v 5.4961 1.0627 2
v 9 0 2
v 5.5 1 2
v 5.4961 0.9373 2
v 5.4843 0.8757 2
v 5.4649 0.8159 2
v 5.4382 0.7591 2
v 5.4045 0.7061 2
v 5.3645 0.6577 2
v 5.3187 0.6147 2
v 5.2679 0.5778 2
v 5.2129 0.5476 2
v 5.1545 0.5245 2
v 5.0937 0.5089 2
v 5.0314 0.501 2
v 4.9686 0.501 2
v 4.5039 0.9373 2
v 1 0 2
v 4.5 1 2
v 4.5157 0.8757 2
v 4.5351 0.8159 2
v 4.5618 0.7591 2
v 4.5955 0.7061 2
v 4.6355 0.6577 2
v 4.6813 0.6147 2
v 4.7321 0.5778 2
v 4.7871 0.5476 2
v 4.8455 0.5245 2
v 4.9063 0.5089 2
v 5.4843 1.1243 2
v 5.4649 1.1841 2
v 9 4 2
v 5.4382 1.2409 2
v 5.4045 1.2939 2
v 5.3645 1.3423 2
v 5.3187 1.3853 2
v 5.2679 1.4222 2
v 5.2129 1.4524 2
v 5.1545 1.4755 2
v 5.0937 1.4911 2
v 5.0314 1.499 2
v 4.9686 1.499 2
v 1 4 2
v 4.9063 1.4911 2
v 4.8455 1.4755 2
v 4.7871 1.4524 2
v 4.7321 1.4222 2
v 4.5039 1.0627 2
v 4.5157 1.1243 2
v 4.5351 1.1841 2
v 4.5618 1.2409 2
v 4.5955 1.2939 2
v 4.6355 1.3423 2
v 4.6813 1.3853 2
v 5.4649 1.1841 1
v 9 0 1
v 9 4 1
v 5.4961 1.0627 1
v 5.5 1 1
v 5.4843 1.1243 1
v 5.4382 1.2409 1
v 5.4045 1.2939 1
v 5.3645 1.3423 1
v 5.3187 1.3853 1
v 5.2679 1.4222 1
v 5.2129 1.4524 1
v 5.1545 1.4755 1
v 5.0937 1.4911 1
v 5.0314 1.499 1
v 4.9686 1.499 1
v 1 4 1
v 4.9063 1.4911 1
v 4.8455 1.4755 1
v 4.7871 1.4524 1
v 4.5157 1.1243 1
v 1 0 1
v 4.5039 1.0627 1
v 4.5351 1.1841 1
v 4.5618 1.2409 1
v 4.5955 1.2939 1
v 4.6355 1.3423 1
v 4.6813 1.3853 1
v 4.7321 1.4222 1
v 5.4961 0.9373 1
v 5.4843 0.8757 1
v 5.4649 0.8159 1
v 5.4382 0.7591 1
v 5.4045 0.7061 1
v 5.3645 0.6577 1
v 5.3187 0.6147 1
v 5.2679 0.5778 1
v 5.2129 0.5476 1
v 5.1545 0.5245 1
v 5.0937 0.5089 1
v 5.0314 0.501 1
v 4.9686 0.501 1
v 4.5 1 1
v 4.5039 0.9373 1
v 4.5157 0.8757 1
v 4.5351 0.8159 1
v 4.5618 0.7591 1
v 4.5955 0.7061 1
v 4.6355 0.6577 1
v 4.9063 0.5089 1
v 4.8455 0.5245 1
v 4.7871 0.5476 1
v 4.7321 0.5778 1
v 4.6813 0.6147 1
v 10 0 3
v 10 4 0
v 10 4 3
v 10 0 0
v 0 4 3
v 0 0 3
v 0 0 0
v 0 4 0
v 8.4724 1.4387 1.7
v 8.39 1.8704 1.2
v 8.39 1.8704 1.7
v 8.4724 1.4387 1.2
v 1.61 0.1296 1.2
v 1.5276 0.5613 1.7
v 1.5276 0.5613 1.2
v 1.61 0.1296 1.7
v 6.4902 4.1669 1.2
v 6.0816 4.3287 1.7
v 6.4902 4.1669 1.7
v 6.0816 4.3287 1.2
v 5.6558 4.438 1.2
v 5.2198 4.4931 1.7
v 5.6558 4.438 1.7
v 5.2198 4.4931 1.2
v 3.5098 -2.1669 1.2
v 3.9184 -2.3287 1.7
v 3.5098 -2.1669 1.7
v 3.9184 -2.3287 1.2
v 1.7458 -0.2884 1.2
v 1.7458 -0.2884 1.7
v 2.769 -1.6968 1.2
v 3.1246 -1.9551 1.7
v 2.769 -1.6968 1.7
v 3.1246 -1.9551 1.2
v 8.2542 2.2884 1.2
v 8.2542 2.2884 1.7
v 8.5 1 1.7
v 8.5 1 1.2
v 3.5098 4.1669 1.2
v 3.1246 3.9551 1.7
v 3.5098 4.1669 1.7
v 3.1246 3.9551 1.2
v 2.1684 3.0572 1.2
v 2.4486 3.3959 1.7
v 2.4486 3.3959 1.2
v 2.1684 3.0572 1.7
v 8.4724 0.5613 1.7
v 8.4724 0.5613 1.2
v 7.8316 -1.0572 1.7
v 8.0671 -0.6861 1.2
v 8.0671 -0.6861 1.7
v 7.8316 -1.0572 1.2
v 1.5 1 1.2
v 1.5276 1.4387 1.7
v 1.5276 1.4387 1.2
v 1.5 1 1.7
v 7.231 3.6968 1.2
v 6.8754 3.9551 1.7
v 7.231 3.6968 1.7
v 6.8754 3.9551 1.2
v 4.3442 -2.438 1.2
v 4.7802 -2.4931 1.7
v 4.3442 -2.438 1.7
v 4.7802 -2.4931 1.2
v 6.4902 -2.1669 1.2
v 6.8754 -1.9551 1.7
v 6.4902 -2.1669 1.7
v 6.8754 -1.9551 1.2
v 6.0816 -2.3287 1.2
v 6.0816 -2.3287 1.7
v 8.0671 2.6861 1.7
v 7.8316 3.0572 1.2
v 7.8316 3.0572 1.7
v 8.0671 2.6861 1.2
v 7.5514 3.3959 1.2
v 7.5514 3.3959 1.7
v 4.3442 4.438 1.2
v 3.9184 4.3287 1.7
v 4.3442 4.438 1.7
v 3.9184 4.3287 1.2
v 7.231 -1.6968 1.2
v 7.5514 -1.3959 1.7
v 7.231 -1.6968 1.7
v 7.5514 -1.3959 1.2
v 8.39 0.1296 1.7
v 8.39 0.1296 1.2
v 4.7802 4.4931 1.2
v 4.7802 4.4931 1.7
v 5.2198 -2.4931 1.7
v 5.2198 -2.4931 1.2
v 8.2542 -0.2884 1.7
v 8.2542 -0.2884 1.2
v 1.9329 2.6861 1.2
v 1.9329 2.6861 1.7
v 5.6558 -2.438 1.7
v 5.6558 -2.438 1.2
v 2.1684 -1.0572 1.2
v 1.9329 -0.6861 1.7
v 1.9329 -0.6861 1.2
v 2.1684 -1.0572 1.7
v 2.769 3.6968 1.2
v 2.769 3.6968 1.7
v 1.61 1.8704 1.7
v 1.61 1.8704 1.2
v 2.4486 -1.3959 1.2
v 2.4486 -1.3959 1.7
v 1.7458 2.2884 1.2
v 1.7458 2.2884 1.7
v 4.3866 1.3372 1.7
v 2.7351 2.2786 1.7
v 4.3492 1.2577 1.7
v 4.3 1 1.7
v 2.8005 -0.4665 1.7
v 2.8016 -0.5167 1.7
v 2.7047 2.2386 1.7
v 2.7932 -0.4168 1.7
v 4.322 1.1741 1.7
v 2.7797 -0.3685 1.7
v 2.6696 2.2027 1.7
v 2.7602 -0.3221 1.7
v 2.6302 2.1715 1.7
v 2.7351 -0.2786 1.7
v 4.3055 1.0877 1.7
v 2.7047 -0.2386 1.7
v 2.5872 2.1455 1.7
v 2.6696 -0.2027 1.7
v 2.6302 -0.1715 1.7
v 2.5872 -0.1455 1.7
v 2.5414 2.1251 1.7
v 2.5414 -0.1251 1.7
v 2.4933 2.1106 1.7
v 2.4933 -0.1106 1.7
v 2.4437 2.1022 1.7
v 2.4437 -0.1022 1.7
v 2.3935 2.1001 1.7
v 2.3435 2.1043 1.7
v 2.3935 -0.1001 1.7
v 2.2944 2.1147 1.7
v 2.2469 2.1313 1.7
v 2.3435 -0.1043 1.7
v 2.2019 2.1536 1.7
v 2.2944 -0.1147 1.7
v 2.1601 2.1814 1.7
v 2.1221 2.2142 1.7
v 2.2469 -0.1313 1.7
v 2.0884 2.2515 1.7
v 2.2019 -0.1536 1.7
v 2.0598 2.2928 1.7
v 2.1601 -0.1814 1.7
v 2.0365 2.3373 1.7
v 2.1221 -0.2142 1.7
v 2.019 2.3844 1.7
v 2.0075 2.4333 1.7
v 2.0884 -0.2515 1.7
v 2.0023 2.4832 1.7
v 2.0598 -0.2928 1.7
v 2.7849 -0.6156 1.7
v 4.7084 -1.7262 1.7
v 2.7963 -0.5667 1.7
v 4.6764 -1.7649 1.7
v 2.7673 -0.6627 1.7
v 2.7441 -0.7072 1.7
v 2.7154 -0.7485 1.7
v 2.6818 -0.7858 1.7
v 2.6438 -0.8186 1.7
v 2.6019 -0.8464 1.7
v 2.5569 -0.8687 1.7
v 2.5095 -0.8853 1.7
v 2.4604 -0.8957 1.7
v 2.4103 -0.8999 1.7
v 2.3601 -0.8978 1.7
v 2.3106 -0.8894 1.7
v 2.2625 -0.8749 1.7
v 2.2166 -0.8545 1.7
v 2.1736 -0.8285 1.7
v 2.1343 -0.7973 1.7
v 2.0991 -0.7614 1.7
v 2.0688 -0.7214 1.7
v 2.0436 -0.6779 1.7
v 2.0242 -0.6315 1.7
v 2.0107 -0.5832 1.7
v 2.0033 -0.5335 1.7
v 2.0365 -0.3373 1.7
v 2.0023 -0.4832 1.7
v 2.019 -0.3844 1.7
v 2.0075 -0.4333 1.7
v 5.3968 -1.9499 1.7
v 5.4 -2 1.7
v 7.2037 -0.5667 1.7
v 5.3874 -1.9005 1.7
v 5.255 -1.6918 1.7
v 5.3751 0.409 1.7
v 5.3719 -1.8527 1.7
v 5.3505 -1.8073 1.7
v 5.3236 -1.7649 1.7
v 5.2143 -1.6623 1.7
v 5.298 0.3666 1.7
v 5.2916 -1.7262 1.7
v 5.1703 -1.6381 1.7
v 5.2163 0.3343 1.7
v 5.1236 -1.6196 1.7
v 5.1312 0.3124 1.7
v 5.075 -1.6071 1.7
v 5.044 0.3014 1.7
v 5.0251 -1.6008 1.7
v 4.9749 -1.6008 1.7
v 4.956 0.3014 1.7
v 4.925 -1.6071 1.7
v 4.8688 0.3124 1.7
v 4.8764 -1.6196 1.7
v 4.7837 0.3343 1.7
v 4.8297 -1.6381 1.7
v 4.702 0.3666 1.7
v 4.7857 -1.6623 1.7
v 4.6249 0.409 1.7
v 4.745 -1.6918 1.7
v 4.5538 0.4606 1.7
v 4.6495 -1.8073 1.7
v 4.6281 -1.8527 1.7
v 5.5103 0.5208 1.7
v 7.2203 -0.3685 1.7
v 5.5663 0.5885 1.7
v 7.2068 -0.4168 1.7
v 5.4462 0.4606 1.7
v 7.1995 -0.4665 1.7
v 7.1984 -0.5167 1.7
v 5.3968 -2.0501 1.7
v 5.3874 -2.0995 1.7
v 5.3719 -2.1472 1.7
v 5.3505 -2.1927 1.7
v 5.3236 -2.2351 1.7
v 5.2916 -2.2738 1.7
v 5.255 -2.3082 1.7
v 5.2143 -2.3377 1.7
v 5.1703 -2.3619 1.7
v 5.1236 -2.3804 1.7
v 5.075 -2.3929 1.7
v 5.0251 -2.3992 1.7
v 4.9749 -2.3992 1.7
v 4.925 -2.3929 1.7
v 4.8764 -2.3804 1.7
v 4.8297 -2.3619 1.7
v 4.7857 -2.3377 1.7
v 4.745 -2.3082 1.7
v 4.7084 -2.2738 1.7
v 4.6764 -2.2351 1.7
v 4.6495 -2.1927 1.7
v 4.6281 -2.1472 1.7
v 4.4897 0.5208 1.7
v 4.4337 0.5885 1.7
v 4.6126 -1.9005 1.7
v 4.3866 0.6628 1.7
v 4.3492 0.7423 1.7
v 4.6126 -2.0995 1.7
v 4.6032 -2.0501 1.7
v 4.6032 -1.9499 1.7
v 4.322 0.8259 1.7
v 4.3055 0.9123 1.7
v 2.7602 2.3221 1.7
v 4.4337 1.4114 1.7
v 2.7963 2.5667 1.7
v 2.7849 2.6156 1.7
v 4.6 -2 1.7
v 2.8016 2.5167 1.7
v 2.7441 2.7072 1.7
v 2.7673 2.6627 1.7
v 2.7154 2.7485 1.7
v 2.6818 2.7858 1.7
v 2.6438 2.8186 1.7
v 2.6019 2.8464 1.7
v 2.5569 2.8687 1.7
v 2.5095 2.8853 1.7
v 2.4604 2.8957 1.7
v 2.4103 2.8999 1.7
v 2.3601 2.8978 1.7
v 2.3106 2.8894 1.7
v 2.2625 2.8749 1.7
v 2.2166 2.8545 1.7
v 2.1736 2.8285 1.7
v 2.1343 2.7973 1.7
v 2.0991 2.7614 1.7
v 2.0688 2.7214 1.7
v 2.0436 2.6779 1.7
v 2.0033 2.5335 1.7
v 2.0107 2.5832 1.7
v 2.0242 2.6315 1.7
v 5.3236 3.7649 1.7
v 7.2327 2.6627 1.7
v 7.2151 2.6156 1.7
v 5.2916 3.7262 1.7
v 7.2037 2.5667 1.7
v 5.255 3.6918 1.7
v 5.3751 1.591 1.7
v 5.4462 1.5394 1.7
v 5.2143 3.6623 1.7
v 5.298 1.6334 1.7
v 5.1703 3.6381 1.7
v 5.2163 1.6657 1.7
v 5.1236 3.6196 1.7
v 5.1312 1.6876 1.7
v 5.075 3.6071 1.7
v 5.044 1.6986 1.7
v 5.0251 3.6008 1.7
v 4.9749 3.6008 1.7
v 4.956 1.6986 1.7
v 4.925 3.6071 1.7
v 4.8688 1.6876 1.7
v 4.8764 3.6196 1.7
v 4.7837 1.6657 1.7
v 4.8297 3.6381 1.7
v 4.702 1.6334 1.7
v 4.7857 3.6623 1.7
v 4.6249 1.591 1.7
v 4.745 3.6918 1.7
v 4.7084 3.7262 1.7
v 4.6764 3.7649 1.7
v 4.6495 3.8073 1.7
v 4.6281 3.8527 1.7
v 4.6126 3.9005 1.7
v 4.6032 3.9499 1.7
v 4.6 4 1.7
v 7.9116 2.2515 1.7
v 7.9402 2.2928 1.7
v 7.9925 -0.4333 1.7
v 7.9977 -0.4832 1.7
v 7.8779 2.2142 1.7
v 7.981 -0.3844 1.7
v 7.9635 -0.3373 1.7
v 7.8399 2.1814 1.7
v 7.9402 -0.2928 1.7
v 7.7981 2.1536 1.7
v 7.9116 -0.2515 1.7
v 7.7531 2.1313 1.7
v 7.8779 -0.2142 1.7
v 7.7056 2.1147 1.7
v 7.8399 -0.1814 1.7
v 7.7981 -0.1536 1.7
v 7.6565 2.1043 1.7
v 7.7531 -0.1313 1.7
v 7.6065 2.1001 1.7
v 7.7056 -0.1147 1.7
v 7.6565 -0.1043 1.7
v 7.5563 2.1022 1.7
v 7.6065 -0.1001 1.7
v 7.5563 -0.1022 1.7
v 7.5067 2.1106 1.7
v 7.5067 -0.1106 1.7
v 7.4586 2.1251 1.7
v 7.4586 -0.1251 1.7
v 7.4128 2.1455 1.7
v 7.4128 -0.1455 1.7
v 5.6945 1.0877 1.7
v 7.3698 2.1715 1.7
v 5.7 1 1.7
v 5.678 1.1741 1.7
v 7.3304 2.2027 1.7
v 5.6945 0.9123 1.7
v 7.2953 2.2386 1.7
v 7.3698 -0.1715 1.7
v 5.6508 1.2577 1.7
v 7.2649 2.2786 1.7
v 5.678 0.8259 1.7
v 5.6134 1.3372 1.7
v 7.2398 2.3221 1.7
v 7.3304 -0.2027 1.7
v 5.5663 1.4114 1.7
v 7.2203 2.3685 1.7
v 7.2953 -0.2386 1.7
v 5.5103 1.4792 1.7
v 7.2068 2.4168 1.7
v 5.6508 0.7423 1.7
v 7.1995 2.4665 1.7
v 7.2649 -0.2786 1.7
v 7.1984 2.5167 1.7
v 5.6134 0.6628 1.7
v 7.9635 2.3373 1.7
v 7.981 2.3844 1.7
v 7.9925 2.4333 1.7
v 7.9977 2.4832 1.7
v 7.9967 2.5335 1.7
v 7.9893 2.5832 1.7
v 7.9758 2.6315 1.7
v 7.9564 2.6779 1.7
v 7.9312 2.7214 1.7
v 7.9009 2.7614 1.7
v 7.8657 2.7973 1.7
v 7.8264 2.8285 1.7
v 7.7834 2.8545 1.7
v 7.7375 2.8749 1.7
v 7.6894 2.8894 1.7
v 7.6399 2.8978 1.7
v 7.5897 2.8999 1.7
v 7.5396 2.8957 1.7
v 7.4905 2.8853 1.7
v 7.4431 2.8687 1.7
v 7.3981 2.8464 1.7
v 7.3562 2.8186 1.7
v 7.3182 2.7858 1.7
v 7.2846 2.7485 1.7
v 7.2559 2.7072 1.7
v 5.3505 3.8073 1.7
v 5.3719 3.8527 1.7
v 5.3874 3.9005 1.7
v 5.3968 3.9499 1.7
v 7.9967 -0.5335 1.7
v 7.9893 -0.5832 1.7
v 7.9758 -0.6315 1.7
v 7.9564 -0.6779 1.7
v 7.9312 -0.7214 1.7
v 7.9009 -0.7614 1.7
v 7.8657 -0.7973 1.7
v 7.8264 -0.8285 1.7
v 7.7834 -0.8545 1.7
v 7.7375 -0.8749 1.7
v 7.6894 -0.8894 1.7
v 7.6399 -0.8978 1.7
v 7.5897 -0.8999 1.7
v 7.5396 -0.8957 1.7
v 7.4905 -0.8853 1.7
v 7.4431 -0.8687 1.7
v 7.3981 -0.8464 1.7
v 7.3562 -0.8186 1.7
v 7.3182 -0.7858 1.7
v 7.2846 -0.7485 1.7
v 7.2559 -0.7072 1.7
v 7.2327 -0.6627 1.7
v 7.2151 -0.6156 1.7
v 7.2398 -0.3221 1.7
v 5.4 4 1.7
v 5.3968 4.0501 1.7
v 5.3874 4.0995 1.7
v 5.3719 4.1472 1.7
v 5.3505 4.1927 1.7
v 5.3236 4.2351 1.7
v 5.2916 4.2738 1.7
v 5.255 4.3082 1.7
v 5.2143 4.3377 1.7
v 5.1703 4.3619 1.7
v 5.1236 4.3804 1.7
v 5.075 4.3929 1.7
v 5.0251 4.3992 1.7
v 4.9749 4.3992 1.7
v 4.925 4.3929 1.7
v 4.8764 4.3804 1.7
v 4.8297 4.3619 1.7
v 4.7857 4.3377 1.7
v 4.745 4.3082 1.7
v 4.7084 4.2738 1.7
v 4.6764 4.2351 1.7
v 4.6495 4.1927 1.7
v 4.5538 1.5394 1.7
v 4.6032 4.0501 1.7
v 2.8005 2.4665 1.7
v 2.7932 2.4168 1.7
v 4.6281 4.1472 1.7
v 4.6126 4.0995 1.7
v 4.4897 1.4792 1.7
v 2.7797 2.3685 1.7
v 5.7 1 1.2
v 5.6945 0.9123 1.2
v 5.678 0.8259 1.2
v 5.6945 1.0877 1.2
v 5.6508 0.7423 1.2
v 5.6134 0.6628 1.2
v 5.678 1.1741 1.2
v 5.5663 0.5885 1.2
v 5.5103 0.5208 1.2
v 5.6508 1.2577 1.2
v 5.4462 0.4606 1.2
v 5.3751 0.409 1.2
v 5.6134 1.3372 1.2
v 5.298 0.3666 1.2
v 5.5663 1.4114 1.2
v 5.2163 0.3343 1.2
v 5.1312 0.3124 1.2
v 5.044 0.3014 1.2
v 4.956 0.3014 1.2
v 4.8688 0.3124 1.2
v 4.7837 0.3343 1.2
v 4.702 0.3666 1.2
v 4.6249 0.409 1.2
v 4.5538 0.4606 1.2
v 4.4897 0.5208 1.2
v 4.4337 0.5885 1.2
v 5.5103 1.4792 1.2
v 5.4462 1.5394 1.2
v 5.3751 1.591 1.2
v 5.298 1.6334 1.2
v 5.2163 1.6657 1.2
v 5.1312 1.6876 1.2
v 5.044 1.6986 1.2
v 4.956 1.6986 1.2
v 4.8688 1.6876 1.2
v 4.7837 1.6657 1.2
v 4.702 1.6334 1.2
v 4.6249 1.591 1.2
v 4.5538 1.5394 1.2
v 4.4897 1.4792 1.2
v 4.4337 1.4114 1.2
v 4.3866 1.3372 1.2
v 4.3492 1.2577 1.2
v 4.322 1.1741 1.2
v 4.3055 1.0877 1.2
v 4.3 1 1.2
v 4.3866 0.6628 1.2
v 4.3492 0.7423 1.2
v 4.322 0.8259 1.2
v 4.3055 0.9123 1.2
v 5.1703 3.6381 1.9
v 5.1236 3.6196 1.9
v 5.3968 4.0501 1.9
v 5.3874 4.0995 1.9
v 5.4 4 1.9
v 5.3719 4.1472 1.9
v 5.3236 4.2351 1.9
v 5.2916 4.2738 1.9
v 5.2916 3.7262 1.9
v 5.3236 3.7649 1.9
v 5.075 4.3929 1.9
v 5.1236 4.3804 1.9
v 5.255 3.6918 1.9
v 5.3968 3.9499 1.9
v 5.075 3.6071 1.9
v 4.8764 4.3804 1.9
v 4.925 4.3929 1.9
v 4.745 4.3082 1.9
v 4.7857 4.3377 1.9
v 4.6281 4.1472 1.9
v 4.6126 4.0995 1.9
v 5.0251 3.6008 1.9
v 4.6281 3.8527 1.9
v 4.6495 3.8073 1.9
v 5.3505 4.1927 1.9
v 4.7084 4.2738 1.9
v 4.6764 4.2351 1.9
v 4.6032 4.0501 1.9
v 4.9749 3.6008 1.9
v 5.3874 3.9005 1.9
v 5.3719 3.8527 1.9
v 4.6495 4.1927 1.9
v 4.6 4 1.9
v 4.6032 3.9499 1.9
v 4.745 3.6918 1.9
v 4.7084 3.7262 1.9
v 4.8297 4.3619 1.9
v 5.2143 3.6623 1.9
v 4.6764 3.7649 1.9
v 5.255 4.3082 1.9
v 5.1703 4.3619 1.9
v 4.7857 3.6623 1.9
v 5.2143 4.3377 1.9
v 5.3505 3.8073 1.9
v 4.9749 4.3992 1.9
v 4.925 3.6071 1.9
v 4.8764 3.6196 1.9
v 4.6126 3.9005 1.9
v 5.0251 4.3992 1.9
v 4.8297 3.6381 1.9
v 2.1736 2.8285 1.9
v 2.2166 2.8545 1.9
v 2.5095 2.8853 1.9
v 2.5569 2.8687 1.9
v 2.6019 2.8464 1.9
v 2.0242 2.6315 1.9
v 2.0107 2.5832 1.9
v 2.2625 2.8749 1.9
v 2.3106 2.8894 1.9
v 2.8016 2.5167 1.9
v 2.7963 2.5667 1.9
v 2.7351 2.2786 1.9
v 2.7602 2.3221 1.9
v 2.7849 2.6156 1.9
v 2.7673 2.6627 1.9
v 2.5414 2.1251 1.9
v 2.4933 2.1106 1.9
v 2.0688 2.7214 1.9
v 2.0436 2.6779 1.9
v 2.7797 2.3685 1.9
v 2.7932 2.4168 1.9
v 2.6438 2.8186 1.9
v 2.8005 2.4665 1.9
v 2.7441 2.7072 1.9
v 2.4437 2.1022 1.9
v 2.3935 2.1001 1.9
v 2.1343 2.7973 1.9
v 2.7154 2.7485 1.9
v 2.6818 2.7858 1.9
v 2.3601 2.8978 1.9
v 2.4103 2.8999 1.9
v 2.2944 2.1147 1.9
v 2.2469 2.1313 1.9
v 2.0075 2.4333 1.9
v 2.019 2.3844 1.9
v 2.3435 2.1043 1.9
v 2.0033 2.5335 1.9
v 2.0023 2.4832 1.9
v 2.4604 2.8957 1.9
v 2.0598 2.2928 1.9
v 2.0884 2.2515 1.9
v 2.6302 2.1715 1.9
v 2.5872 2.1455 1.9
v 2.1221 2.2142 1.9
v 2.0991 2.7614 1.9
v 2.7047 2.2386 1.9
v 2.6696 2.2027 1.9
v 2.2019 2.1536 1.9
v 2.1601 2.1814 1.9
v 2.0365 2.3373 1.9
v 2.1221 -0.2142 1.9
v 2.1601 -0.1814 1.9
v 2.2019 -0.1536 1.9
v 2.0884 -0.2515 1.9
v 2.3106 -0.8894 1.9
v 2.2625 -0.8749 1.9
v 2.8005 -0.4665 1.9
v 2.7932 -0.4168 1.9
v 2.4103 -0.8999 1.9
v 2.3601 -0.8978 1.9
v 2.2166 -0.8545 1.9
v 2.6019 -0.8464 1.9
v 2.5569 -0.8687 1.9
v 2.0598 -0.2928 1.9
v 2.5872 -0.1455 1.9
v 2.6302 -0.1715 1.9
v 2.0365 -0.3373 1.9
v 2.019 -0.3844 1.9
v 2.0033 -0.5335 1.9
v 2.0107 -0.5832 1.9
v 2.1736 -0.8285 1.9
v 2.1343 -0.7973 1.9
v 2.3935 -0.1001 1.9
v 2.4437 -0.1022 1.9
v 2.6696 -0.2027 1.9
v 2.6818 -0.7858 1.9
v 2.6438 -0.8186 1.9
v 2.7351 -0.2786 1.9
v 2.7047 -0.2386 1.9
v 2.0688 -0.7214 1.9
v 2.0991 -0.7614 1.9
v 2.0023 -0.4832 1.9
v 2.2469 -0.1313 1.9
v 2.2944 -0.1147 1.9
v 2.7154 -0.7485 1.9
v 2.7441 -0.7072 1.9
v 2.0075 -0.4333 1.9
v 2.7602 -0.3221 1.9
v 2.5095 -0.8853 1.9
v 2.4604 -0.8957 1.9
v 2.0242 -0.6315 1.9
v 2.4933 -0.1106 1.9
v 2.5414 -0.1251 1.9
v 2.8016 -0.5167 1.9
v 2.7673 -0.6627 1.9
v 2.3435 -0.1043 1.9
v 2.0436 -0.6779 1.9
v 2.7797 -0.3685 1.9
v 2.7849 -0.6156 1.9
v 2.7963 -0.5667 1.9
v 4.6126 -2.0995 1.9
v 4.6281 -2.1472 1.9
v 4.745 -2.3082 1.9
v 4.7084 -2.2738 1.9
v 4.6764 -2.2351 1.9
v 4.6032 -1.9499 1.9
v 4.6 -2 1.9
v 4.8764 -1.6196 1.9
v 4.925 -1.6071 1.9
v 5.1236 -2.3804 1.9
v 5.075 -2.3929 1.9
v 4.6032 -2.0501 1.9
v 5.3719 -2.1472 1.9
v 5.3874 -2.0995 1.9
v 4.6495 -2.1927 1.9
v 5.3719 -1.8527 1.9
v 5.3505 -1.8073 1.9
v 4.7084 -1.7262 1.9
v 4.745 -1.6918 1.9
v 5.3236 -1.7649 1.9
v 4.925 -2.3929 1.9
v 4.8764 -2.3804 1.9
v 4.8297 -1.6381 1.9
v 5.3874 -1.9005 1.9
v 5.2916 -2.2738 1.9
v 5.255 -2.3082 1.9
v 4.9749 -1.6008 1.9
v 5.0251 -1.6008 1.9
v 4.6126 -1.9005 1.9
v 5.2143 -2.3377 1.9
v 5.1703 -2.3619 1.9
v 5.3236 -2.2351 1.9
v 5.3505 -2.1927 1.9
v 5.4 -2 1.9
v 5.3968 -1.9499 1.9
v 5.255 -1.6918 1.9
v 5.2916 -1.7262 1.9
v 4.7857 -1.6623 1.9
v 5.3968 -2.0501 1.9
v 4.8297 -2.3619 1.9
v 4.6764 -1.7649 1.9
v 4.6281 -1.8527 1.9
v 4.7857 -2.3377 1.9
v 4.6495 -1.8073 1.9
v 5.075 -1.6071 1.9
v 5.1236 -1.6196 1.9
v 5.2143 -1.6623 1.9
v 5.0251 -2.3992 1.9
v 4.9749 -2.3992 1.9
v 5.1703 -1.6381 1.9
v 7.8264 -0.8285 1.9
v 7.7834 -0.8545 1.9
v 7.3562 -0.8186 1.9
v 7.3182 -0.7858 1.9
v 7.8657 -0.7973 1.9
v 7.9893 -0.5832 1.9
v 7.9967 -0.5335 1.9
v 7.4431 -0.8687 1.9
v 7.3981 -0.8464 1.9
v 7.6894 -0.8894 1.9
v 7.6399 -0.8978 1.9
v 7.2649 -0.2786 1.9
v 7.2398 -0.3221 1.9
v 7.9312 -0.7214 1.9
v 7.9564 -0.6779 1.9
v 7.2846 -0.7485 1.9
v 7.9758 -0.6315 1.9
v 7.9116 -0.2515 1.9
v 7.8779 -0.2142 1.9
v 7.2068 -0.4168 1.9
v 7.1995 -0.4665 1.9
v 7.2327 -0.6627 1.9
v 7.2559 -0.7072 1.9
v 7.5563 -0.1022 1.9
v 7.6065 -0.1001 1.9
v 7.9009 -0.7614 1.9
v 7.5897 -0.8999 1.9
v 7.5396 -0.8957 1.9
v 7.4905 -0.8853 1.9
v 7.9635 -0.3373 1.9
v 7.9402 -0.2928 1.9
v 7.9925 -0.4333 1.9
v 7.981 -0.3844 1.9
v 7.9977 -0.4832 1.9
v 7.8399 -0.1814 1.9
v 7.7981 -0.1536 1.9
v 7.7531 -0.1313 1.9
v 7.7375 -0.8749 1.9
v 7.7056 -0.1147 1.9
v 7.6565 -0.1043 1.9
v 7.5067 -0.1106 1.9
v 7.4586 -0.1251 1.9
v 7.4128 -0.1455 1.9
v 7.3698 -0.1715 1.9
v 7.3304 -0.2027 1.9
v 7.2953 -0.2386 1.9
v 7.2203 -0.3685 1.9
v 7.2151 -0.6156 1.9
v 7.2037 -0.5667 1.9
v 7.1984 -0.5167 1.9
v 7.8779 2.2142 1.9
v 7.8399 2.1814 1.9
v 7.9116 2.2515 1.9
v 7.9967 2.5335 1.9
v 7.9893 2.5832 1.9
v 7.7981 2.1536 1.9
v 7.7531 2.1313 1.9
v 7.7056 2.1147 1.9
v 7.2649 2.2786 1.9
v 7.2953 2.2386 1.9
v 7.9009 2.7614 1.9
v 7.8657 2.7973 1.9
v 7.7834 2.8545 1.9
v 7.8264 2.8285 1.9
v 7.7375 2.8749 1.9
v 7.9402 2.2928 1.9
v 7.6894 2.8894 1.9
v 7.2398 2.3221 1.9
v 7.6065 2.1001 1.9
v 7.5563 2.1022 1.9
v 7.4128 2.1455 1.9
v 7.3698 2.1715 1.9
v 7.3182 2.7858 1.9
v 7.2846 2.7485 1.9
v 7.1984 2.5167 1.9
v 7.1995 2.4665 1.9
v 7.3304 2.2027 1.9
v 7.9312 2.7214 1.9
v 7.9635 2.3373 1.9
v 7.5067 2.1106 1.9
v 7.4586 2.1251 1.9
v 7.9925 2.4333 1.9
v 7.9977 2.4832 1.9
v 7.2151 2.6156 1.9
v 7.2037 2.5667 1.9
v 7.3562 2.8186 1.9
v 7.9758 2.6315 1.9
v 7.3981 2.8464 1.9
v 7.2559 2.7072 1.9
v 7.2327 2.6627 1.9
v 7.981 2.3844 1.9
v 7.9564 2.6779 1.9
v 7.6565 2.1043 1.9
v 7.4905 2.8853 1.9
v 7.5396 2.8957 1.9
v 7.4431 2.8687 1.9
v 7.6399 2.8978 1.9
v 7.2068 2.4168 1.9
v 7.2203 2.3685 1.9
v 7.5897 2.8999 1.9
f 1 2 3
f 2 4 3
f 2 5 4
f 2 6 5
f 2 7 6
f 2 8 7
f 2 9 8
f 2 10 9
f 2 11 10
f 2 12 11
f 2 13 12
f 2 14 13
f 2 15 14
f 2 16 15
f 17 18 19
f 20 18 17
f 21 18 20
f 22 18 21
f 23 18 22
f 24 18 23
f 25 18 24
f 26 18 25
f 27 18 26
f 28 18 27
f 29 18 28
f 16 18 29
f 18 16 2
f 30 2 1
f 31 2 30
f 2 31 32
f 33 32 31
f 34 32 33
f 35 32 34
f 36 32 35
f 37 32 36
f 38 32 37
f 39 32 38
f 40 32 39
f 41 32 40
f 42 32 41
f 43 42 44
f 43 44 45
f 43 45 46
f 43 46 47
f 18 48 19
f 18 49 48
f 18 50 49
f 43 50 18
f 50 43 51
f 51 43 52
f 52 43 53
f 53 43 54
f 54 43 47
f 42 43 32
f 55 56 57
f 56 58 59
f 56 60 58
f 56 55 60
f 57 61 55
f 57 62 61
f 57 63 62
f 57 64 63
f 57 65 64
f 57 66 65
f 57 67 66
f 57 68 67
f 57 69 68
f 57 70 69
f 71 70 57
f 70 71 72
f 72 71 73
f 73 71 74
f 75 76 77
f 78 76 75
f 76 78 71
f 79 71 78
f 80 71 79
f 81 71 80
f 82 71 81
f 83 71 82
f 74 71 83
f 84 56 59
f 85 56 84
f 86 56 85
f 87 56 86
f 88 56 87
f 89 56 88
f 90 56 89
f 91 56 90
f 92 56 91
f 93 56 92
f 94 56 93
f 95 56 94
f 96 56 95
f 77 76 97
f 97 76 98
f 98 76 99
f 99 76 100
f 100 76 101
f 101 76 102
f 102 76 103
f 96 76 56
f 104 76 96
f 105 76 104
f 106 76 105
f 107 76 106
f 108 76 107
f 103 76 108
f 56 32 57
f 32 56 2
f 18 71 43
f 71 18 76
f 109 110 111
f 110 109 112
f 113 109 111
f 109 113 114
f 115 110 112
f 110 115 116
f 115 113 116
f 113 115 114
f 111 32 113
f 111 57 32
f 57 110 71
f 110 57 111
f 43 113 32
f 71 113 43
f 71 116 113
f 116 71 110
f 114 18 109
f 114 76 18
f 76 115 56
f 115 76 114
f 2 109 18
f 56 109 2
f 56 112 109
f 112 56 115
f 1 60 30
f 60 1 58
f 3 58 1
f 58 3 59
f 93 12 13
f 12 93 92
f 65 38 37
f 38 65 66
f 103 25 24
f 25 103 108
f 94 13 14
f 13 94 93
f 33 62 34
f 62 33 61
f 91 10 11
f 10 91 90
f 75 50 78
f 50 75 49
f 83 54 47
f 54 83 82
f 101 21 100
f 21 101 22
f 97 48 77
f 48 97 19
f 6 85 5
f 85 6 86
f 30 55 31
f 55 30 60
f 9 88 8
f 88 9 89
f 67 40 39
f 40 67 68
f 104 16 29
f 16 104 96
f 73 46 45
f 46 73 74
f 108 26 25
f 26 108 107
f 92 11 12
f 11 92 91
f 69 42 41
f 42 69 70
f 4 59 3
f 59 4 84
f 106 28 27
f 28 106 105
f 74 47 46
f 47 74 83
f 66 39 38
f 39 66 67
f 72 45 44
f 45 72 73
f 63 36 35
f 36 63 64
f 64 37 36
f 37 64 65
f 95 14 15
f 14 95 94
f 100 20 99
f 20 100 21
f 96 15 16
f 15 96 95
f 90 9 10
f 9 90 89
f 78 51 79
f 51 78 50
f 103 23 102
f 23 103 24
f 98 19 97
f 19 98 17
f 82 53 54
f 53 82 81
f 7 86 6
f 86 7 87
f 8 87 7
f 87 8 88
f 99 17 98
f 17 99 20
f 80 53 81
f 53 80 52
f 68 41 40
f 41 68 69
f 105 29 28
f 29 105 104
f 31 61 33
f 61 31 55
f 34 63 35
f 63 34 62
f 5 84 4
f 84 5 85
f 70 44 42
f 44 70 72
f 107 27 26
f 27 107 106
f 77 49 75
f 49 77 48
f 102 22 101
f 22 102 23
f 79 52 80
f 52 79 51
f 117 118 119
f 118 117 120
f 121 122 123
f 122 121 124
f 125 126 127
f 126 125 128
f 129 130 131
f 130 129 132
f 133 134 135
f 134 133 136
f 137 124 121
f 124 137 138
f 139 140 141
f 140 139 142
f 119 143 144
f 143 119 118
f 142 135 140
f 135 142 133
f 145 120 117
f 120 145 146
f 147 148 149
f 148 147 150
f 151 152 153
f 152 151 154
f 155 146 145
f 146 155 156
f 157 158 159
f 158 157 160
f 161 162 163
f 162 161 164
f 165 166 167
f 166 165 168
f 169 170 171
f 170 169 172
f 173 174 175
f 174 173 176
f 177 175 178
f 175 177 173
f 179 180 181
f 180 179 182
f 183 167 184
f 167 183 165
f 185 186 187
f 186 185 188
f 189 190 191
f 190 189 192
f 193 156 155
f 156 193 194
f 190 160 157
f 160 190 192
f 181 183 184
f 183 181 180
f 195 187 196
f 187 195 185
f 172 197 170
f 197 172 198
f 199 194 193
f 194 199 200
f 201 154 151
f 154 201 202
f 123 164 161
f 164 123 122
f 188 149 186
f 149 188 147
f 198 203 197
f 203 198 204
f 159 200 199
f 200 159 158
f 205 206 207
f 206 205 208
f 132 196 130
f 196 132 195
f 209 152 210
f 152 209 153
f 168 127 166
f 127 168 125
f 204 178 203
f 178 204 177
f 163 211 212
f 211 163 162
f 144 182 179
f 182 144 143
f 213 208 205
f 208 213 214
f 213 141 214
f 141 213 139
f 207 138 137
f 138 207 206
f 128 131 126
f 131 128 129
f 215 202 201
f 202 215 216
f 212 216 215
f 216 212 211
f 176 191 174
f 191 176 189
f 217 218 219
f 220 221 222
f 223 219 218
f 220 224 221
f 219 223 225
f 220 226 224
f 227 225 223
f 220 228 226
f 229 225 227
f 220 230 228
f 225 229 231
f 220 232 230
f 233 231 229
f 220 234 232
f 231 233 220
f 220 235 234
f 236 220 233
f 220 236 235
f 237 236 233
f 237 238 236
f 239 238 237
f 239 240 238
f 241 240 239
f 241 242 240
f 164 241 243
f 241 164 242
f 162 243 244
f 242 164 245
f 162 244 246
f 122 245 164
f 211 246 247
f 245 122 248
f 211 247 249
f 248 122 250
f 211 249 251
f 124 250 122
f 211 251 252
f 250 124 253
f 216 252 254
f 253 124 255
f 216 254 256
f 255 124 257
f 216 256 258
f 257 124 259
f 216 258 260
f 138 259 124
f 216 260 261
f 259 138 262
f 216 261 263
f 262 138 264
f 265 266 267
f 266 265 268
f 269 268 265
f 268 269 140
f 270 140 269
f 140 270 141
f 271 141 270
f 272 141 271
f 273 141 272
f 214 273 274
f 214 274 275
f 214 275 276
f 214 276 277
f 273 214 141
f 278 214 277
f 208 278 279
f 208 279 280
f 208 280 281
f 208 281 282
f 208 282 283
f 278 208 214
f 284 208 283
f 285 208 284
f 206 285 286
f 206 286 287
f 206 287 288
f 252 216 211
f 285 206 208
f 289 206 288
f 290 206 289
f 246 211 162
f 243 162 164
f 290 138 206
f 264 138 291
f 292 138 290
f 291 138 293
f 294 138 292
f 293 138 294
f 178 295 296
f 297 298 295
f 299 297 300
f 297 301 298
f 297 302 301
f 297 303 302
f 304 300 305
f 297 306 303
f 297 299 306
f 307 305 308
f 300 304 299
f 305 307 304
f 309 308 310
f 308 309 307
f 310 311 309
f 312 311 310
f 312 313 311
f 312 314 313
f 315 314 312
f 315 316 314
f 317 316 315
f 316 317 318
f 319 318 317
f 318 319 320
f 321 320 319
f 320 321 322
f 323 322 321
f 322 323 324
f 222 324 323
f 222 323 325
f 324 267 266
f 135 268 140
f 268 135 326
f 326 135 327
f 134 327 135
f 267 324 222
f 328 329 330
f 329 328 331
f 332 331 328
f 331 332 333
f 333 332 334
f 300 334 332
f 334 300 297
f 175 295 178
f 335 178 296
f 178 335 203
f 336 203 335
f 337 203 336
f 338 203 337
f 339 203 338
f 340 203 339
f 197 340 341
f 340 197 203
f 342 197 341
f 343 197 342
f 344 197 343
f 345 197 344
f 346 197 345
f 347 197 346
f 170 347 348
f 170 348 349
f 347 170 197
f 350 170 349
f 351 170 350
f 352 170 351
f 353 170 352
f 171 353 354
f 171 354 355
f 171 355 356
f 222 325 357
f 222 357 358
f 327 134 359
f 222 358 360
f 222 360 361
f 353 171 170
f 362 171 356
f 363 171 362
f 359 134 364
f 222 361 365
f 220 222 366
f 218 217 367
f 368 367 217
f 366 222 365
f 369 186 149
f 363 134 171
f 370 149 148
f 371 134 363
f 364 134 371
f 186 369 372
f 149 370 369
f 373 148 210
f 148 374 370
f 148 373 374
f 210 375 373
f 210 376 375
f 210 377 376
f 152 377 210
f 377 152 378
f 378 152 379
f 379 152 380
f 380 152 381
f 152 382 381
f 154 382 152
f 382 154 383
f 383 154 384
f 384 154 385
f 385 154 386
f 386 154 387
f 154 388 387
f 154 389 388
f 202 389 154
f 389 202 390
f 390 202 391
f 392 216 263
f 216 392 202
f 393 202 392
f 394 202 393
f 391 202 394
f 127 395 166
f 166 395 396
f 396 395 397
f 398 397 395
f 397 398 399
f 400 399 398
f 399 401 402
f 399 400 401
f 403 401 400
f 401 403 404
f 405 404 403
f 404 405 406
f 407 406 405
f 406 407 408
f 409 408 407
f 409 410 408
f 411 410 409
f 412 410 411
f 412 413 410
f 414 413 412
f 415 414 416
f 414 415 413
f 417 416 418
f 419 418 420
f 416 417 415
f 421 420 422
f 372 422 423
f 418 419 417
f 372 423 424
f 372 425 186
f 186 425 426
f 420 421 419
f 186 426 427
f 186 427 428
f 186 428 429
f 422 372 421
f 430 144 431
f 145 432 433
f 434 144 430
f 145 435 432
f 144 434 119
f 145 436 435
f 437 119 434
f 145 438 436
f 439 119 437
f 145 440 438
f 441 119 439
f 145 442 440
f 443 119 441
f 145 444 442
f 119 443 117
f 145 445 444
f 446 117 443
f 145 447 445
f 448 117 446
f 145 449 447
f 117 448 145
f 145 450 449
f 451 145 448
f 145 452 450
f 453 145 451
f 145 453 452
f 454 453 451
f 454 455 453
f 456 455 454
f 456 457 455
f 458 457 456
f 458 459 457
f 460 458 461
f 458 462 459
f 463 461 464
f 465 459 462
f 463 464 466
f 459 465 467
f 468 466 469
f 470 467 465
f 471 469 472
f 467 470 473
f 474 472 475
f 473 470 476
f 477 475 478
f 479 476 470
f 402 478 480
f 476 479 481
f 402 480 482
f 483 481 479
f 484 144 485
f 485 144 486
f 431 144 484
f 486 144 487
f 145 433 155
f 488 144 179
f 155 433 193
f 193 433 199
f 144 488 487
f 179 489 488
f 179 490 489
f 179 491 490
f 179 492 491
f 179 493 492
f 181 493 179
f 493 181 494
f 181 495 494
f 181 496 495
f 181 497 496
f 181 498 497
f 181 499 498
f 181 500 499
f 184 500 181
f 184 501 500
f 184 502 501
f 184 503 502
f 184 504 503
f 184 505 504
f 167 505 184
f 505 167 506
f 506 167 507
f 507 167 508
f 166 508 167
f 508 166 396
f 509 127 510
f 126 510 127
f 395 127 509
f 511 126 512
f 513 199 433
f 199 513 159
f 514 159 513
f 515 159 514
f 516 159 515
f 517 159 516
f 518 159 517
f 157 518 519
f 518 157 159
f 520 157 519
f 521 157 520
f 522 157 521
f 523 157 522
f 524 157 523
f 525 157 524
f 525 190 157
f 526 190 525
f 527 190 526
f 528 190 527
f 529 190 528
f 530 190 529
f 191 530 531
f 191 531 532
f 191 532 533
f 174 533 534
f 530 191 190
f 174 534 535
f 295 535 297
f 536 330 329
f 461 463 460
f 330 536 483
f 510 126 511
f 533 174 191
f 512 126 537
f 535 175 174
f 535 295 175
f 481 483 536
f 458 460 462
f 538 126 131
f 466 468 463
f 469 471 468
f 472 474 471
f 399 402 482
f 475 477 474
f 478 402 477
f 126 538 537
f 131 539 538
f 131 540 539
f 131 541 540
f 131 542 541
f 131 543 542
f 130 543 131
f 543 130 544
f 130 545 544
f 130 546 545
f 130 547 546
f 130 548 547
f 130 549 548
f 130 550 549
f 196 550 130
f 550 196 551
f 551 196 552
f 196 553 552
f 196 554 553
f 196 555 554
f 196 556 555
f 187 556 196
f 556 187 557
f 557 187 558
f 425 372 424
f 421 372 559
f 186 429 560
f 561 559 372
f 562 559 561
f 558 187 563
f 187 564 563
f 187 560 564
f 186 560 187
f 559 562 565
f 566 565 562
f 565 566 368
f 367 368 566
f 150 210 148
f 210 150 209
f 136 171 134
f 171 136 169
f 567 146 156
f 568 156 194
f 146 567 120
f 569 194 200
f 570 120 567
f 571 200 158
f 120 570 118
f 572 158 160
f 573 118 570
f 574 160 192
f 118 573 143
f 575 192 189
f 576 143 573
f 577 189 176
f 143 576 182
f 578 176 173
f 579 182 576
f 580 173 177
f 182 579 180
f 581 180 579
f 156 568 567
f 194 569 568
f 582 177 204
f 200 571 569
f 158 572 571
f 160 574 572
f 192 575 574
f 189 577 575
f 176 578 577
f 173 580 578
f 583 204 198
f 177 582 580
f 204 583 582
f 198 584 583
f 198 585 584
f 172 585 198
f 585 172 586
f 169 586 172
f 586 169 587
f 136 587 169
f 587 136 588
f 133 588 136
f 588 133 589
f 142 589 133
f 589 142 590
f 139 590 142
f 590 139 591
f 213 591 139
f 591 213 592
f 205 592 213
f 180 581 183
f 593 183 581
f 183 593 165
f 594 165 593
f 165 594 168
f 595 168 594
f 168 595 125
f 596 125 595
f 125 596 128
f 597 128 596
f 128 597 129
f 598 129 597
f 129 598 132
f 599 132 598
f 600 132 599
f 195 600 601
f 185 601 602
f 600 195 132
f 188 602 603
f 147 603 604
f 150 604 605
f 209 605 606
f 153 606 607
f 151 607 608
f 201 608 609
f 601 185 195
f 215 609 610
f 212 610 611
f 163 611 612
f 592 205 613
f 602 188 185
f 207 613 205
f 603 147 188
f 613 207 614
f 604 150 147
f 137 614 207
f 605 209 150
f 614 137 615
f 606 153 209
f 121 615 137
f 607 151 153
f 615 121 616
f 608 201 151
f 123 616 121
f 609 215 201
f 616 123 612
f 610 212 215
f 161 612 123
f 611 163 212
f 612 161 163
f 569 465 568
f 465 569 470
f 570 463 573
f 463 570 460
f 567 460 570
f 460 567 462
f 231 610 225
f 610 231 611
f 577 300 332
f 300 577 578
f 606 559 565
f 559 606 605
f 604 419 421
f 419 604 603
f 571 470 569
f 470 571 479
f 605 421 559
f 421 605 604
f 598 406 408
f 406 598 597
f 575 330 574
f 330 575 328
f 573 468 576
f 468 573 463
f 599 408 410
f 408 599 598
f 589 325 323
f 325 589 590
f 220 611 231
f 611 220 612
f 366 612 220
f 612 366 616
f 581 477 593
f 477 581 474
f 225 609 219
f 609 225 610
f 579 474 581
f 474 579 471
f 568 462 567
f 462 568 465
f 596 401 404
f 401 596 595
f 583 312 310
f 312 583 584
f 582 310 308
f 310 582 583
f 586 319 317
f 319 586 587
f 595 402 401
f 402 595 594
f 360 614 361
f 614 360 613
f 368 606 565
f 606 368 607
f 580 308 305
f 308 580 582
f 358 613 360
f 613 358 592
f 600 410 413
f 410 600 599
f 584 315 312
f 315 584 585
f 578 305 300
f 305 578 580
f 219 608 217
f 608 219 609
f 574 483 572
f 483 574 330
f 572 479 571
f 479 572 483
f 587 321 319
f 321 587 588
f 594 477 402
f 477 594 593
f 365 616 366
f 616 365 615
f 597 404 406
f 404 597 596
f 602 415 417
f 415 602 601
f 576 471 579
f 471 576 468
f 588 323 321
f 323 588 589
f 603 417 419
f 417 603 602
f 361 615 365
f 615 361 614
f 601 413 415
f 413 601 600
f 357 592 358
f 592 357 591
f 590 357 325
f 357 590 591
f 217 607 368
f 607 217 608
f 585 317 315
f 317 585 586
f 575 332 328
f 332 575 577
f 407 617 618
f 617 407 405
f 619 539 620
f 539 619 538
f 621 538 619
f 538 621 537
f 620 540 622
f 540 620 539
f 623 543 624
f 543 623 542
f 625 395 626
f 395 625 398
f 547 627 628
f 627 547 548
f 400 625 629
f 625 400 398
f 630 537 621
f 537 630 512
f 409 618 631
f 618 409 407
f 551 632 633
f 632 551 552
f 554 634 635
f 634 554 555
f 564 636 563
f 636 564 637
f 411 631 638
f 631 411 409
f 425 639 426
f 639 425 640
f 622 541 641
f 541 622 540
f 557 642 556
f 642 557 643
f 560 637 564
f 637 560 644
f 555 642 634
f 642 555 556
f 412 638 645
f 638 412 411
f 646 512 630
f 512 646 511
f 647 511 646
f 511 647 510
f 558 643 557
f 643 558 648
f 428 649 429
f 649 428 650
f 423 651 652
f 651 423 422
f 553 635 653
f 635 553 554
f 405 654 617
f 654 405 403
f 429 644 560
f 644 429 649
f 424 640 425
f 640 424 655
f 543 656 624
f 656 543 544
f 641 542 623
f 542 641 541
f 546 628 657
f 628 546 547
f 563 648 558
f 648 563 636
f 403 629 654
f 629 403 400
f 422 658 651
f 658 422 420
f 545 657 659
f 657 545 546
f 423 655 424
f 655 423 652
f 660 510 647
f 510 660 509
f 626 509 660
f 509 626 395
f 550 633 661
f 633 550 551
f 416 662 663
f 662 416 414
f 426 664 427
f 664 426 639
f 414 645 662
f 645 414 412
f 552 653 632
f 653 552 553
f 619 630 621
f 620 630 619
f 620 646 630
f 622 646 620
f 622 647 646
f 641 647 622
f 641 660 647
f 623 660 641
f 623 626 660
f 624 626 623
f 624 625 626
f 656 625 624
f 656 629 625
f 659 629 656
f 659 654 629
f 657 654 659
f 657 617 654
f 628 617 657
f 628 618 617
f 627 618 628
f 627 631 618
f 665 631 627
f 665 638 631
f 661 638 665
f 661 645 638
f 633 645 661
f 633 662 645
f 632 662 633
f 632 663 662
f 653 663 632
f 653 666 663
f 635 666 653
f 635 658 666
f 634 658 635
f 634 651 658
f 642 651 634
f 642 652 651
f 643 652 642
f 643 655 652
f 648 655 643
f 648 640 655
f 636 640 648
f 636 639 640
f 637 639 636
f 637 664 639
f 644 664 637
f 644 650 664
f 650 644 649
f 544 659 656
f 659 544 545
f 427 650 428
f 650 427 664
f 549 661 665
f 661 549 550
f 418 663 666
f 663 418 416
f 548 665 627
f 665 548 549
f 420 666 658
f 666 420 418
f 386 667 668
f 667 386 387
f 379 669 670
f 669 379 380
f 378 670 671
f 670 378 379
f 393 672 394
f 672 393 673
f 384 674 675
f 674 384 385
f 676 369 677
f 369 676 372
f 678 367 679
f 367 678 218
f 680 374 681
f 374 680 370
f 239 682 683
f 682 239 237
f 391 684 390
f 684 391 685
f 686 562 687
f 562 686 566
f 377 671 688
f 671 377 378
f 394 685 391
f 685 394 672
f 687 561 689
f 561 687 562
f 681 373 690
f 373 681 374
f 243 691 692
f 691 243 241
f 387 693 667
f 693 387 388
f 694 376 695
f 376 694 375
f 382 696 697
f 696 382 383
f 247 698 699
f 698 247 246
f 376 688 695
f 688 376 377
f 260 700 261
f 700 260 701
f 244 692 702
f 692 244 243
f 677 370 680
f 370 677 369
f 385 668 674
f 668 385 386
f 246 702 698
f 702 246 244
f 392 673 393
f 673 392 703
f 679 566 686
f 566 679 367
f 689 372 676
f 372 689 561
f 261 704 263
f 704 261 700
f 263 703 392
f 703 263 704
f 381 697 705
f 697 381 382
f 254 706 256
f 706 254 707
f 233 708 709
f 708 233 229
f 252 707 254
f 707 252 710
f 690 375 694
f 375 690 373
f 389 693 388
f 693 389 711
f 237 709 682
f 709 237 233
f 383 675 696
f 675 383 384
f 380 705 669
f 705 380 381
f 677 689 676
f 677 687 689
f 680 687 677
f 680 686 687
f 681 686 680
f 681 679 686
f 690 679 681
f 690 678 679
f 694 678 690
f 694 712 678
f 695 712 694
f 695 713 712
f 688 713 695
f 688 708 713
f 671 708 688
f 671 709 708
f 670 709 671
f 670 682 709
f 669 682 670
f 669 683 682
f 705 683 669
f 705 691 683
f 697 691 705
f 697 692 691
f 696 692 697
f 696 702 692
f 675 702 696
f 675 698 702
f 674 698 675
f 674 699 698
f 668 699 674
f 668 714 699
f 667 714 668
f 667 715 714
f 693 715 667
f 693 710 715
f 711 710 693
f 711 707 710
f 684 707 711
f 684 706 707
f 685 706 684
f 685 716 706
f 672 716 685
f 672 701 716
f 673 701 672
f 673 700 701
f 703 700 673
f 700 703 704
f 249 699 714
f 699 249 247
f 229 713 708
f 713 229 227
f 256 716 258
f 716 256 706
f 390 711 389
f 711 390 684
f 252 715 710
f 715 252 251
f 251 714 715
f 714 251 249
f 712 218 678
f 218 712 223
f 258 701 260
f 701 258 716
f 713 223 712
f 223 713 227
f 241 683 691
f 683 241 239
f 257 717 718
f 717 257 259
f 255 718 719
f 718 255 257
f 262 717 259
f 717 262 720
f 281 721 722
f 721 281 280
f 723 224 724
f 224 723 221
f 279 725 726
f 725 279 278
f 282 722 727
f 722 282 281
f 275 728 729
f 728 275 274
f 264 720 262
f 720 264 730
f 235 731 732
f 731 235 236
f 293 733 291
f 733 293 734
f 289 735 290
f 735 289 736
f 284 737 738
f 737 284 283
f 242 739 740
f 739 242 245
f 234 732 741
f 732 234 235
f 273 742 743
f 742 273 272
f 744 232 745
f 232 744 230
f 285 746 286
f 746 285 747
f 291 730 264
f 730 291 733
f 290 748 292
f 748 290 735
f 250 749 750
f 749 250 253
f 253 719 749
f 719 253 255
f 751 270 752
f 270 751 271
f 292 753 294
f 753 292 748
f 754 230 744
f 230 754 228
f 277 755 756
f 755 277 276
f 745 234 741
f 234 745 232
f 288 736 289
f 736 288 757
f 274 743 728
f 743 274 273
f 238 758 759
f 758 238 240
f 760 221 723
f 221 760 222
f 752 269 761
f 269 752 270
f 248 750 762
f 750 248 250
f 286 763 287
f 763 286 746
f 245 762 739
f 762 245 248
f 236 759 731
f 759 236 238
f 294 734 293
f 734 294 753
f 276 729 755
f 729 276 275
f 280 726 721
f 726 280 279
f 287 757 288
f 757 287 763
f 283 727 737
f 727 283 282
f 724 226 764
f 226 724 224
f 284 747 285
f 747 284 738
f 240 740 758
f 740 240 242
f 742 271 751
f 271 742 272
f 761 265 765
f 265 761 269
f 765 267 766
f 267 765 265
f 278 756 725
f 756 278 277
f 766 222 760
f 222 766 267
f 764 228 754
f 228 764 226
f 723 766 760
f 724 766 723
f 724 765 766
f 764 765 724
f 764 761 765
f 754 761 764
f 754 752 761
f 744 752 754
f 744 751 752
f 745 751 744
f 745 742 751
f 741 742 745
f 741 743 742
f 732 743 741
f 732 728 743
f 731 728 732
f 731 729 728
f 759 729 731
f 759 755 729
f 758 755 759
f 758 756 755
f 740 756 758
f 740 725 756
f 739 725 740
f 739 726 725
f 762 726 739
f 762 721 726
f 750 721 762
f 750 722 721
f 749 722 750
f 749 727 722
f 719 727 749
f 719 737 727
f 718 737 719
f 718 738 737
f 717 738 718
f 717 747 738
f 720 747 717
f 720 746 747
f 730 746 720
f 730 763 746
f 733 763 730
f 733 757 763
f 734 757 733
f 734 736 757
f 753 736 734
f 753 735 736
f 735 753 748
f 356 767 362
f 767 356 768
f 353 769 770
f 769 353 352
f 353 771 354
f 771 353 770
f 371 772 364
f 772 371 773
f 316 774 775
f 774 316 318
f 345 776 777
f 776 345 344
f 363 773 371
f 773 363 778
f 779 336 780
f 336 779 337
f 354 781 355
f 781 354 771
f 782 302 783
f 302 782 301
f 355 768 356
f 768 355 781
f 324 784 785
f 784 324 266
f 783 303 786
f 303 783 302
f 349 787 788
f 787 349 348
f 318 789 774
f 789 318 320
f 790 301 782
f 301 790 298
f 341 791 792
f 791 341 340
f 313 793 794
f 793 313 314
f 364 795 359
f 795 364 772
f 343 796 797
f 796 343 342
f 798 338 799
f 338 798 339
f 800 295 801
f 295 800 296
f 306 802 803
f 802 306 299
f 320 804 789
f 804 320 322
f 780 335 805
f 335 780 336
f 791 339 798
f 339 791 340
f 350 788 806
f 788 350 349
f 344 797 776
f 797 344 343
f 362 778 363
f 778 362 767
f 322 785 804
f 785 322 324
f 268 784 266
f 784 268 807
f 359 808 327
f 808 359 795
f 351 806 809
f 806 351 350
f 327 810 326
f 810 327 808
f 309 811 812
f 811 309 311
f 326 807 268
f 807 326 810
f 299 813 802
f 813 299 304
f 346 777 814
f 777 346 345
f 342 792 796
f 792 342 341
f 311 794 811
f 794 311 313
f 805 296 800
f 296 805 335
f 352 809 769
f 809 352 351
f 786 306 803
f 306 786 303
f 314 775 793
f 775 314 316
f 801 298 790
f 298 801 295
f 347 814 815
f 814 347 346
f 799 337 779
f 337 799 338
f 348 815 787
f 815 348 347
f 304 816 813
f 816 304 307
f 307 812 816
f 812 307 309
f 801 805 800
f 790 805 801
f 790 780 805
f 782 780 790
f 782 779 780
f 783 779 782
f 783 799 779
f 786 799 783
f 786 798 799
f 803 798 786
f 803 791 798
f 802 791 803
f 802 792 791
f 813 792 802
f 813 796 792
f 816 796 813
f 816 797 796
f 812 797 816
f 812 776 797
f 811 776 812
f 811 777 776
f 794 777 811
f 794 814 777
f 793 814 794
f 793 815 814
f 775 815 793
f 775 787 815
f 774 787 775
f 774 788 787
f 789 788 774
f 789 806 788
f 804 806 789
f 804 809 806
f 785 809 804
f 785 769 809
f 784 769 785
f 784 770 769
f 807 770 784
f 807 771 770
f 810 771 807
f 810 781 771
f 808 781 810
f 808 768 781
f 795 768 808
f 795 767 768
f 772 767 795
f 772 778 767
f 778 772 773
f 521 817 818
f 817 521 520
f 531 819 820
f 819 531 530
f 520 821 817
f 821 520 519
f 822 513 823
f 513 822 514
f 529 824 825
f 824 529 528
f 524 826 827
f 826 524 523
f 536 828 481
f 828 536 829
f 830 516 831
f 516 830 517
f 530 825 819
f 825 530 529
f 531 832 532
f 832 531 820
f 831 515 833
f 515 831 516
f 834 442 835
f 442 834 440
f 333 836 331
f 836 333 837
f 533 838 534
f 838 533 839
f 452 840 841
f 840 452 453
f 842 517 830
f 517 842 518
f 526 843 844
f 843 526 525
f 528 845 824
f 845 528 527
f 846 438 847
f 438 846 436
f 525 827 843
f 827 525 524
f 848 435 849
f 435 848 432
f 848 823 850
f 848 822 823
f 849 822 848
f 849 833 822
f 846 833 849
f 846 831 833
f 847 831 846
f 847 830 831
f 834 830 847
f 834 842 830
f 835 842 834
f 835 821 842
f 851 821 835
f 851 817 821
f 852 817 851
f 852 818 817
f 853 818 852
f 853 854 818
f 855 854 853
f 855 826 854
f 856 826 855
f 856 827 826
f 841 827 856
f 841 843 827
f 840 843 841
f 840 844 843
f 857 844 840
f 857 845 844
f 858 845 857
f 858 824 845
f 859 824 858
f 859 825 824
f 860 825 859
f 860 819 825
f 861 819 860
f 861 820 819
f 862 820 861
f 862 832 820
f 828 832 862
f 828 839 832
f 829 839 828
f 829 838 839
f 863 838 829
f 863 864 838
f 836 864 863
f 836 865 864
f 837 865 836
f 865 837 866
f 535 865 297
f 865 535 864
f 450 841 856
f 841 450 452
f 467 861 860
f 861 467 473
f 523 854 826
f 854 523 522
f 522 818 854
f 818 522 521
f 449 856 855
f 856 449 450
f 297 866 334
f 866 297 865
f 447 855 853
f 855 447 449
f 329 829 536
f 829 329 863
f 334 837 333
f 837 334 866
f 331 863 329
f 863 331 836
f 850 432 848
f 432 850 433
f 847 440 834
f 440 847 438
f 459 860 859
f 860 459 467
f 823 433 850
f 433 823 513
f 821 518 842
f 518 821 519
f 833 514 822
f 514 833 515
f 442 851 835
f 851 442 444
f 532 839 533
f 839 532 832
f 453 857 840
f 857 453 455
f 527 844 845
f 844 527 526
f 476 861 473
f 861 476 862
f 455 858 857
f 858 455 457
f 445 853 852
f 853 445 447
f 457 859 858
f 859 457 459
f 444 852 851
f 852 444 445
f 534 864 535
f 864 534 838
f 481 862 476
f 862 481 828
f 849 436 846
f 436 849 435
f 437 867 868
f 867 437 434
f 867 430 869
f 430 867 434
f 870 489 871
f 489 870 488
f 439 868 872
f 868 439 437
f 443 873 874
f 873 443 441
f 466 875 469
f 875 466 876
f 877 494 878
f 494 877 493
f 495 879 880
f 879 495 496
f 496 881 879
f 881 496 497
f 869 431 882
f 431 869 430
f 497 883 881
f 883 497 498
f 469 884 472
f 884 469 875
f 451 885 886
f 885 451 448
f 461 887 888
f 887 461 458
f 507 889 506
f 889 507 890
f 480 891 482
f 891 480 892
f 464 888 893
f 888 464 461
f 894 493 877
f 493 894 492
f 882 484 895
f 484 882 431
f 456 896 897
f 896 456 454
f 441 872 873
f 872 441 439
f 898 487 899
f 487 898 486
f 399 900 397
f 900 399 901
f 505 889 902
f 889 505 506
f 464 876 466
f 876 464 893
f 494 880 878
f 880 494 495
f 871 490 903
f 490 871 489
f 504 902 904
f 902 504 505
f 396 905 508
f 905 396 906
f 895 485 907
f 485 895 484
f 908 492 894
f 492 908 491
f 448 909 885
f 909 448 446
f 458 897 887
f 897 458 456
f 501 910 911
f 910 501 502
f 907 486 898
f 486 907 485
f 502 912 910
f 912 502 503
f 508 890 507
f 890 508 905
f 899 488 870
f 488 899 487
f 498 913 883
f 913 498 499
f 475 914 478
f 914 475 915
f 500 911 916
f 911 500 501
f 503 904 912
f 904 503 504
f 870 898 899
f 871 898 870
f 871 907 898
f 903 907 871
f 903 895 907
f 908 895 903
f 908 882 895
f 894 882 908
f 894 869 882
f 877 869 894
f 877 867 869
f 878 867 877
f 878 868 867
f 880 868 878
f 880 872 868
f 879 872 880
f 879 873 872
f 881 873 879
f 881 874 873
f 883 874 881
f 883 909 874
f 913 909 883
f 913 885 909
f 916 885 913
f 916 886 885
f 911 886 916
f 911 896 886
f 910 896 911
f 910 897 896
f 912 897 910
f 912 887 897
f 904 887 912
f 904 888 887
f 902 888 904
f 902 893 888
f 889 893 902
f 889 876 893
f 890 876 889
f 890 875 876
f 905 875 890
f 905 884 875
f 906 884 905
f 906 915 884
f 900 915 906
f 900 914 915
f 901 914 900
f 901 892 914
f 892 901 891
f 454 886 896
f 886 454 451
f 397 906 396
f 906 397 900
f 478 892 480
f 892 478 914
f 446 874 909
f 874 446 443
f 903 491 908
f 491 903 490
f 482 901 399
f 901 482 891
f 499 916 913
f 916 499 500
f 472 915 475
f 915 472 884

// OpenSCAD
module inner(){
 	translate([1,1,0])
 		cube([6,7,1]);
 	cube([8,6,1]);
 }
 
 module box(){
 	difference(){
 		cube([10,4,3]);
 
 		translate([1,-1,1])
 			inner();
 	}
 	
 	translate([5,1,0])
 		cylinder(r=0.5, h=3, $fn=50);
 }
 
 module roller(){
 	difference(){
 		color("red")
 			translate([5,1,1.2])
 			cylinder(r=3.5, h=0.5, $fn=50);
 
 		translate([5,1,1])
 			cylinder(r=0.7, h=1, $fn=50);
 	}
 }
 
 module vex(){
 	translate([5, 1, 1.4])
 		for( i = [0:5] ){
 
 			rotate(i*360/6, [0,0,1])
 			translate([0, 3, 0])
 			cylinder(r=0.4, h=0.5, $fn=50);
 	}
 }
 
 box();
 roller();
 vex();
